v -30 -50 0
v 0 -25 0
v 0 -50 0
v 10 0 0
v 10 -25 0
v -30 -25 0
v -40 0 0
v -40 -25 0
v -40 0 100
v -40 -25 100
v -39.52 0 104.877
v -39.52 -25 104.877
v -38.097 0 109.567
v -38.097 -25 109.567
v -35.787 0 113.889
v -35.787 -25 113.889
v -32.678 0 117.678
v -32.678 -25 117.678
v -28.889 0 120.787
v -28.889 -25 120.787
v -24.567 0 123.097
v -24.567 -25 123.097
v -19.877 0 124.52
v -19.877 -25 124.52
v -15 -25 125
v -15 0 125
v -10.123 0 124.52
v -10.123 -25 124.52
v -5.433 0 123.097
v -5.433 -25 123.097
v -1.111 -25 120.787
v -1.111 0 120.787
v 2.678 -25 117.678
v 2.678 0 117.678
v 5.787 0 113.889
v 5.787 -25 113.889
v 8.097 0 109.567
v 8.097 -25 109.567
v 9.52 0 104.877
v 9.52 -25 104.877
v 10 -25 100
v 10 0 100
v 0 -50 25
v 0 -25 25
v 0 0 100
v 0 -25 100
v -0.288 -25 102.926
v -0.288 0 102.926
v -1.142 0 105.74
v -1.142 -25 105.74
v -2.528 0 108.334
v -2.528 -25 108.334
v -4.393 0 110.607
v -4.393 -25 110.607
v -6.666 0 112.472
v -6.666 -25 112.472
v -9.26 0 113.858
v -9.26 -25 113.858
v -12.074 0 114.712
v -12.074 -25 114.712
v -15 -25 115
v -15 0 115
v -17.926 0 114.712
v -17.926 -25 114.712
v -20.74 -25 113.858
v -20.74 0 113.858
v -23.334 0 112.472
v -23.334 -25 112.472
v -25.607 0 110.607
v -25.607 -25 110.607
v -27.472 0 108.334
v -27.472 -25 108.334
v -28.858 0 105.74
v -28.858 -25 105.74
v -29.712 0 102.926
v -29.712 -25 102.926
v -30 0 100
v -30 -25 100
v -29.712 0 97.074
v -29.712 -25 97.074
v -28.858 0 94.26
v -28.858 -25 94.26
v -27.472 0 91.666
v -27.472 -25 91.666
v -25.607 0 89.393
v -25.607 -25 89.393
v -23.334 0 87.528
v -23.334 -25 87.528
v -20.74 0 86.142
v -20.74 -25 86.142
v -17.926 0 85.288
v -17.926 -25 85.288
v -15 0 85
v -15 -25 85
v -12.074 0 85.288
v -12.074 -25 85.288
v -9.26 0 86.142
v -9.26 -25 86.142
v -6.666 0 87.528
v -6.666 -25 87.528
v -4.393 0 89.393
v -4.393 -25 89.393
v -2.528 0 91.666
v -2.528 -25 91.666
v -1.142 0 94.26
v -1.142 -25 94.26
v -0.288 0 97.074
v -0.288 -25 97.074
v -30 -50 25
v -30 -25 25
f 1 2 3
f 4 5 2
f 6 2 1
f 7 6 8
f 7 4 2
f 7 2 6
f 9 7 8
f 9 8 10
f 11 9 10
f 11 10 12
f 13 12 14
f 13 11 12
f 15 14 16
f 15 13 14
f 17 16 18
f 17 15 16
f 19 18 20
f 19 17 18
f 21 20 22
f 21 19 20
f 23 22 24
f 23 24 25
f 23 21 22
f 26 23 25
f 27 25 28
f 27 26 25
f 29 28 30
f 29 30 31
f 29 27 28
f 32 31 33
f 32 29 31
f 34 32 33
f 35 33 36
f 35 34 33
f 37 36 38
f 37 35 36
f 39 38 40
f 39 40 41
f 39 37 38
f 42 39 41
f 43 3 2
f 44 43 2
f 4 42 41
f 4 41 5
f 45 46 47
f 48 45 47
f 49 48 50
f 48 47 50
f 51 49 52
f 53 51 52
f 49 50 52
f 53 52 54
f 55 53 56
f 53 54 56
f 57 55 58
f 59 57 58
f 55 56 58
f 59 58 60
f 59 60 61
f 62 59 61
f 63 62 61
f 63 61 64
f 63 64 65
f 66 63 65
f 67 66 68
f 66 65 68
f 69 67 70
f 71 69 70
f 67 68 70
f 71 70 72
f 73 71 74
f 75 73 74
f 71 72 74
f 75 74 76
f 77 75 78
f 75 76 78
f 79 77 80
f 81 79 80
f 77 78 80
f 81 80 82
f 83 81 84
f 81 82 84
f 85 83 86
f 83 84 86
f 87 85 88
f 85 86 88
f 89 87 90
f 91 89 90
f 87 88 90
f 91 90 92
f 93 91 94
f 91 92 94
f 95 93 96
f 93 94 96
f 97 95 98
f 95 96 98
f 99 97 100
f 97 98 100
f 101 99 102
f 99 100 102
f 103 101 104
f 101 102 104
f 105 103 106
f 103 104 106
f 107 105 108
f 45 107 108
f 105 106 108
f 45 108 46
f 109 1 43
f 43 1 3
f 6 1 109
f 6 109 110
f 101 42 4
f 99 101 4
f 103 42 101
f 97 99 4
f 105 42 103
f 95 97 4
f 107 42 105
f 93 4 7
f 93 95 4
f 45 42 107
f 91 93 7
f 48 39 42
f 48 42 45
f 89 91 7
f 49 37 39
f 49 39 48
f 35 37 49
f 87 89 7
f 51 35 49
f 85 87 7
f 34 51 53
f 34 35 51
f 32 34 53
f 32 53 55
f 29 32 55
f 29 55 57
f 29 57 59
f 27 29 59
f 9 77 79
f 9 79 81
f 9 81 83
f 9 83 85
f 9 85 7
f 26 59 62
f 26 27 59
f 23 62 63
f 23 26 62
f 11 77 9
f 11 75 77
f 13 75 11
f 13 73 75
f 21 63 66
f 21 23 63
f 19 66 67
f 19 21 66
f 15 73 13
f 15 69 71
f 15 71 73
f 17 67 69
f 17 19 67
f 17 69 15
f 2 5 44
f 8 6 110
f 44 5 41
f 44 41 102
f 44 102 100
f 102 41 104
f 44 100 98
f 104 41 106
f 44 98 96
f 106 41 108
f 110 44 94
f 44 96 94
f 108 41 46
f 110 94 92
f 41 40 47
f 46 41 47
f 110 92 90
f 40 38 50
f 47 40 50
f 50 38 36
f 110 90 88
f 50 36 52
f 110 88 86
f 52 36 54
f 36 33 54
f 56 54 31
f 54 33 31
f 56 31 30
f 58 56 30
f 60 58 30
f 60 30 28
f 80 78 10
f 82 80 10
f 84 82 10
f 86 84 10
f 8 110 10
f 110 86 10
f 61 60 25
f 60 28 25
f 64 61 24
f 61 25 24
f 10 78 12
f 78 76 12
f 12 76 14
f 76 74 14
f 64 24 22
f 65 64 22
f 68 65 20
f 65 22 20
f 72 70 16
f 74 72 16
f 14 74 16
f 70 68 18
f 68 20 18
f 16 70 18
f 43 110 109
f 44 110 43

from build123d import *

# Parameters (mm, degrees)
F0_W     = 30
F0_H     = 50
F1_DEPTH = 25
F2_W     = 30
F2_H     = 25
F3_DEPTH = 25
F4_R     = 15
F5_DEPTH = 25


with BuildPart() as f1:
    # F0 (on Top) → F1 (new body)
    with BuildSketch(Plane.XY):
        with Locations((-15, -25)):
            Rectangle(F0_W, F0_H)
    extrude(amount=F1_DEPTH)

    # F2 (on face) → F3 (join)
    with BuildSketch(Plane(origin=(0, 0, 0), x_dir=(-1, 0, 0), z_dir=(0, 1, 0))):
        with BuildLine():
            Line((-10, 100), (-10, 0))
            Line((-10, 0), (0, 0))
            Line((0, 0), (0, 25))
            Line((0, 25), (30, 25))
            Line((30, 25), (30, 0))
            Line((30, 0), (40, 0))
            Line((40, 0), (40, 100))
            ThreePointArc((40, 100), (15, 125), (-10, 100))
        make_face()
        with Locations((15, 12.5)):
            Rectangle(F2_W, F2_H)
    extrude(amount=-F3_DEPTH)

    # F4 (on face) → F5 (cut)
    with BuildSketch(Plane.XZ.offset(25)):
        with Locations((-15, 100)):
            Circle(F4_R)
    extrude(amount=-F5_DEPTH, mode=Mode.SUBTRACT)


solid = f1.part
